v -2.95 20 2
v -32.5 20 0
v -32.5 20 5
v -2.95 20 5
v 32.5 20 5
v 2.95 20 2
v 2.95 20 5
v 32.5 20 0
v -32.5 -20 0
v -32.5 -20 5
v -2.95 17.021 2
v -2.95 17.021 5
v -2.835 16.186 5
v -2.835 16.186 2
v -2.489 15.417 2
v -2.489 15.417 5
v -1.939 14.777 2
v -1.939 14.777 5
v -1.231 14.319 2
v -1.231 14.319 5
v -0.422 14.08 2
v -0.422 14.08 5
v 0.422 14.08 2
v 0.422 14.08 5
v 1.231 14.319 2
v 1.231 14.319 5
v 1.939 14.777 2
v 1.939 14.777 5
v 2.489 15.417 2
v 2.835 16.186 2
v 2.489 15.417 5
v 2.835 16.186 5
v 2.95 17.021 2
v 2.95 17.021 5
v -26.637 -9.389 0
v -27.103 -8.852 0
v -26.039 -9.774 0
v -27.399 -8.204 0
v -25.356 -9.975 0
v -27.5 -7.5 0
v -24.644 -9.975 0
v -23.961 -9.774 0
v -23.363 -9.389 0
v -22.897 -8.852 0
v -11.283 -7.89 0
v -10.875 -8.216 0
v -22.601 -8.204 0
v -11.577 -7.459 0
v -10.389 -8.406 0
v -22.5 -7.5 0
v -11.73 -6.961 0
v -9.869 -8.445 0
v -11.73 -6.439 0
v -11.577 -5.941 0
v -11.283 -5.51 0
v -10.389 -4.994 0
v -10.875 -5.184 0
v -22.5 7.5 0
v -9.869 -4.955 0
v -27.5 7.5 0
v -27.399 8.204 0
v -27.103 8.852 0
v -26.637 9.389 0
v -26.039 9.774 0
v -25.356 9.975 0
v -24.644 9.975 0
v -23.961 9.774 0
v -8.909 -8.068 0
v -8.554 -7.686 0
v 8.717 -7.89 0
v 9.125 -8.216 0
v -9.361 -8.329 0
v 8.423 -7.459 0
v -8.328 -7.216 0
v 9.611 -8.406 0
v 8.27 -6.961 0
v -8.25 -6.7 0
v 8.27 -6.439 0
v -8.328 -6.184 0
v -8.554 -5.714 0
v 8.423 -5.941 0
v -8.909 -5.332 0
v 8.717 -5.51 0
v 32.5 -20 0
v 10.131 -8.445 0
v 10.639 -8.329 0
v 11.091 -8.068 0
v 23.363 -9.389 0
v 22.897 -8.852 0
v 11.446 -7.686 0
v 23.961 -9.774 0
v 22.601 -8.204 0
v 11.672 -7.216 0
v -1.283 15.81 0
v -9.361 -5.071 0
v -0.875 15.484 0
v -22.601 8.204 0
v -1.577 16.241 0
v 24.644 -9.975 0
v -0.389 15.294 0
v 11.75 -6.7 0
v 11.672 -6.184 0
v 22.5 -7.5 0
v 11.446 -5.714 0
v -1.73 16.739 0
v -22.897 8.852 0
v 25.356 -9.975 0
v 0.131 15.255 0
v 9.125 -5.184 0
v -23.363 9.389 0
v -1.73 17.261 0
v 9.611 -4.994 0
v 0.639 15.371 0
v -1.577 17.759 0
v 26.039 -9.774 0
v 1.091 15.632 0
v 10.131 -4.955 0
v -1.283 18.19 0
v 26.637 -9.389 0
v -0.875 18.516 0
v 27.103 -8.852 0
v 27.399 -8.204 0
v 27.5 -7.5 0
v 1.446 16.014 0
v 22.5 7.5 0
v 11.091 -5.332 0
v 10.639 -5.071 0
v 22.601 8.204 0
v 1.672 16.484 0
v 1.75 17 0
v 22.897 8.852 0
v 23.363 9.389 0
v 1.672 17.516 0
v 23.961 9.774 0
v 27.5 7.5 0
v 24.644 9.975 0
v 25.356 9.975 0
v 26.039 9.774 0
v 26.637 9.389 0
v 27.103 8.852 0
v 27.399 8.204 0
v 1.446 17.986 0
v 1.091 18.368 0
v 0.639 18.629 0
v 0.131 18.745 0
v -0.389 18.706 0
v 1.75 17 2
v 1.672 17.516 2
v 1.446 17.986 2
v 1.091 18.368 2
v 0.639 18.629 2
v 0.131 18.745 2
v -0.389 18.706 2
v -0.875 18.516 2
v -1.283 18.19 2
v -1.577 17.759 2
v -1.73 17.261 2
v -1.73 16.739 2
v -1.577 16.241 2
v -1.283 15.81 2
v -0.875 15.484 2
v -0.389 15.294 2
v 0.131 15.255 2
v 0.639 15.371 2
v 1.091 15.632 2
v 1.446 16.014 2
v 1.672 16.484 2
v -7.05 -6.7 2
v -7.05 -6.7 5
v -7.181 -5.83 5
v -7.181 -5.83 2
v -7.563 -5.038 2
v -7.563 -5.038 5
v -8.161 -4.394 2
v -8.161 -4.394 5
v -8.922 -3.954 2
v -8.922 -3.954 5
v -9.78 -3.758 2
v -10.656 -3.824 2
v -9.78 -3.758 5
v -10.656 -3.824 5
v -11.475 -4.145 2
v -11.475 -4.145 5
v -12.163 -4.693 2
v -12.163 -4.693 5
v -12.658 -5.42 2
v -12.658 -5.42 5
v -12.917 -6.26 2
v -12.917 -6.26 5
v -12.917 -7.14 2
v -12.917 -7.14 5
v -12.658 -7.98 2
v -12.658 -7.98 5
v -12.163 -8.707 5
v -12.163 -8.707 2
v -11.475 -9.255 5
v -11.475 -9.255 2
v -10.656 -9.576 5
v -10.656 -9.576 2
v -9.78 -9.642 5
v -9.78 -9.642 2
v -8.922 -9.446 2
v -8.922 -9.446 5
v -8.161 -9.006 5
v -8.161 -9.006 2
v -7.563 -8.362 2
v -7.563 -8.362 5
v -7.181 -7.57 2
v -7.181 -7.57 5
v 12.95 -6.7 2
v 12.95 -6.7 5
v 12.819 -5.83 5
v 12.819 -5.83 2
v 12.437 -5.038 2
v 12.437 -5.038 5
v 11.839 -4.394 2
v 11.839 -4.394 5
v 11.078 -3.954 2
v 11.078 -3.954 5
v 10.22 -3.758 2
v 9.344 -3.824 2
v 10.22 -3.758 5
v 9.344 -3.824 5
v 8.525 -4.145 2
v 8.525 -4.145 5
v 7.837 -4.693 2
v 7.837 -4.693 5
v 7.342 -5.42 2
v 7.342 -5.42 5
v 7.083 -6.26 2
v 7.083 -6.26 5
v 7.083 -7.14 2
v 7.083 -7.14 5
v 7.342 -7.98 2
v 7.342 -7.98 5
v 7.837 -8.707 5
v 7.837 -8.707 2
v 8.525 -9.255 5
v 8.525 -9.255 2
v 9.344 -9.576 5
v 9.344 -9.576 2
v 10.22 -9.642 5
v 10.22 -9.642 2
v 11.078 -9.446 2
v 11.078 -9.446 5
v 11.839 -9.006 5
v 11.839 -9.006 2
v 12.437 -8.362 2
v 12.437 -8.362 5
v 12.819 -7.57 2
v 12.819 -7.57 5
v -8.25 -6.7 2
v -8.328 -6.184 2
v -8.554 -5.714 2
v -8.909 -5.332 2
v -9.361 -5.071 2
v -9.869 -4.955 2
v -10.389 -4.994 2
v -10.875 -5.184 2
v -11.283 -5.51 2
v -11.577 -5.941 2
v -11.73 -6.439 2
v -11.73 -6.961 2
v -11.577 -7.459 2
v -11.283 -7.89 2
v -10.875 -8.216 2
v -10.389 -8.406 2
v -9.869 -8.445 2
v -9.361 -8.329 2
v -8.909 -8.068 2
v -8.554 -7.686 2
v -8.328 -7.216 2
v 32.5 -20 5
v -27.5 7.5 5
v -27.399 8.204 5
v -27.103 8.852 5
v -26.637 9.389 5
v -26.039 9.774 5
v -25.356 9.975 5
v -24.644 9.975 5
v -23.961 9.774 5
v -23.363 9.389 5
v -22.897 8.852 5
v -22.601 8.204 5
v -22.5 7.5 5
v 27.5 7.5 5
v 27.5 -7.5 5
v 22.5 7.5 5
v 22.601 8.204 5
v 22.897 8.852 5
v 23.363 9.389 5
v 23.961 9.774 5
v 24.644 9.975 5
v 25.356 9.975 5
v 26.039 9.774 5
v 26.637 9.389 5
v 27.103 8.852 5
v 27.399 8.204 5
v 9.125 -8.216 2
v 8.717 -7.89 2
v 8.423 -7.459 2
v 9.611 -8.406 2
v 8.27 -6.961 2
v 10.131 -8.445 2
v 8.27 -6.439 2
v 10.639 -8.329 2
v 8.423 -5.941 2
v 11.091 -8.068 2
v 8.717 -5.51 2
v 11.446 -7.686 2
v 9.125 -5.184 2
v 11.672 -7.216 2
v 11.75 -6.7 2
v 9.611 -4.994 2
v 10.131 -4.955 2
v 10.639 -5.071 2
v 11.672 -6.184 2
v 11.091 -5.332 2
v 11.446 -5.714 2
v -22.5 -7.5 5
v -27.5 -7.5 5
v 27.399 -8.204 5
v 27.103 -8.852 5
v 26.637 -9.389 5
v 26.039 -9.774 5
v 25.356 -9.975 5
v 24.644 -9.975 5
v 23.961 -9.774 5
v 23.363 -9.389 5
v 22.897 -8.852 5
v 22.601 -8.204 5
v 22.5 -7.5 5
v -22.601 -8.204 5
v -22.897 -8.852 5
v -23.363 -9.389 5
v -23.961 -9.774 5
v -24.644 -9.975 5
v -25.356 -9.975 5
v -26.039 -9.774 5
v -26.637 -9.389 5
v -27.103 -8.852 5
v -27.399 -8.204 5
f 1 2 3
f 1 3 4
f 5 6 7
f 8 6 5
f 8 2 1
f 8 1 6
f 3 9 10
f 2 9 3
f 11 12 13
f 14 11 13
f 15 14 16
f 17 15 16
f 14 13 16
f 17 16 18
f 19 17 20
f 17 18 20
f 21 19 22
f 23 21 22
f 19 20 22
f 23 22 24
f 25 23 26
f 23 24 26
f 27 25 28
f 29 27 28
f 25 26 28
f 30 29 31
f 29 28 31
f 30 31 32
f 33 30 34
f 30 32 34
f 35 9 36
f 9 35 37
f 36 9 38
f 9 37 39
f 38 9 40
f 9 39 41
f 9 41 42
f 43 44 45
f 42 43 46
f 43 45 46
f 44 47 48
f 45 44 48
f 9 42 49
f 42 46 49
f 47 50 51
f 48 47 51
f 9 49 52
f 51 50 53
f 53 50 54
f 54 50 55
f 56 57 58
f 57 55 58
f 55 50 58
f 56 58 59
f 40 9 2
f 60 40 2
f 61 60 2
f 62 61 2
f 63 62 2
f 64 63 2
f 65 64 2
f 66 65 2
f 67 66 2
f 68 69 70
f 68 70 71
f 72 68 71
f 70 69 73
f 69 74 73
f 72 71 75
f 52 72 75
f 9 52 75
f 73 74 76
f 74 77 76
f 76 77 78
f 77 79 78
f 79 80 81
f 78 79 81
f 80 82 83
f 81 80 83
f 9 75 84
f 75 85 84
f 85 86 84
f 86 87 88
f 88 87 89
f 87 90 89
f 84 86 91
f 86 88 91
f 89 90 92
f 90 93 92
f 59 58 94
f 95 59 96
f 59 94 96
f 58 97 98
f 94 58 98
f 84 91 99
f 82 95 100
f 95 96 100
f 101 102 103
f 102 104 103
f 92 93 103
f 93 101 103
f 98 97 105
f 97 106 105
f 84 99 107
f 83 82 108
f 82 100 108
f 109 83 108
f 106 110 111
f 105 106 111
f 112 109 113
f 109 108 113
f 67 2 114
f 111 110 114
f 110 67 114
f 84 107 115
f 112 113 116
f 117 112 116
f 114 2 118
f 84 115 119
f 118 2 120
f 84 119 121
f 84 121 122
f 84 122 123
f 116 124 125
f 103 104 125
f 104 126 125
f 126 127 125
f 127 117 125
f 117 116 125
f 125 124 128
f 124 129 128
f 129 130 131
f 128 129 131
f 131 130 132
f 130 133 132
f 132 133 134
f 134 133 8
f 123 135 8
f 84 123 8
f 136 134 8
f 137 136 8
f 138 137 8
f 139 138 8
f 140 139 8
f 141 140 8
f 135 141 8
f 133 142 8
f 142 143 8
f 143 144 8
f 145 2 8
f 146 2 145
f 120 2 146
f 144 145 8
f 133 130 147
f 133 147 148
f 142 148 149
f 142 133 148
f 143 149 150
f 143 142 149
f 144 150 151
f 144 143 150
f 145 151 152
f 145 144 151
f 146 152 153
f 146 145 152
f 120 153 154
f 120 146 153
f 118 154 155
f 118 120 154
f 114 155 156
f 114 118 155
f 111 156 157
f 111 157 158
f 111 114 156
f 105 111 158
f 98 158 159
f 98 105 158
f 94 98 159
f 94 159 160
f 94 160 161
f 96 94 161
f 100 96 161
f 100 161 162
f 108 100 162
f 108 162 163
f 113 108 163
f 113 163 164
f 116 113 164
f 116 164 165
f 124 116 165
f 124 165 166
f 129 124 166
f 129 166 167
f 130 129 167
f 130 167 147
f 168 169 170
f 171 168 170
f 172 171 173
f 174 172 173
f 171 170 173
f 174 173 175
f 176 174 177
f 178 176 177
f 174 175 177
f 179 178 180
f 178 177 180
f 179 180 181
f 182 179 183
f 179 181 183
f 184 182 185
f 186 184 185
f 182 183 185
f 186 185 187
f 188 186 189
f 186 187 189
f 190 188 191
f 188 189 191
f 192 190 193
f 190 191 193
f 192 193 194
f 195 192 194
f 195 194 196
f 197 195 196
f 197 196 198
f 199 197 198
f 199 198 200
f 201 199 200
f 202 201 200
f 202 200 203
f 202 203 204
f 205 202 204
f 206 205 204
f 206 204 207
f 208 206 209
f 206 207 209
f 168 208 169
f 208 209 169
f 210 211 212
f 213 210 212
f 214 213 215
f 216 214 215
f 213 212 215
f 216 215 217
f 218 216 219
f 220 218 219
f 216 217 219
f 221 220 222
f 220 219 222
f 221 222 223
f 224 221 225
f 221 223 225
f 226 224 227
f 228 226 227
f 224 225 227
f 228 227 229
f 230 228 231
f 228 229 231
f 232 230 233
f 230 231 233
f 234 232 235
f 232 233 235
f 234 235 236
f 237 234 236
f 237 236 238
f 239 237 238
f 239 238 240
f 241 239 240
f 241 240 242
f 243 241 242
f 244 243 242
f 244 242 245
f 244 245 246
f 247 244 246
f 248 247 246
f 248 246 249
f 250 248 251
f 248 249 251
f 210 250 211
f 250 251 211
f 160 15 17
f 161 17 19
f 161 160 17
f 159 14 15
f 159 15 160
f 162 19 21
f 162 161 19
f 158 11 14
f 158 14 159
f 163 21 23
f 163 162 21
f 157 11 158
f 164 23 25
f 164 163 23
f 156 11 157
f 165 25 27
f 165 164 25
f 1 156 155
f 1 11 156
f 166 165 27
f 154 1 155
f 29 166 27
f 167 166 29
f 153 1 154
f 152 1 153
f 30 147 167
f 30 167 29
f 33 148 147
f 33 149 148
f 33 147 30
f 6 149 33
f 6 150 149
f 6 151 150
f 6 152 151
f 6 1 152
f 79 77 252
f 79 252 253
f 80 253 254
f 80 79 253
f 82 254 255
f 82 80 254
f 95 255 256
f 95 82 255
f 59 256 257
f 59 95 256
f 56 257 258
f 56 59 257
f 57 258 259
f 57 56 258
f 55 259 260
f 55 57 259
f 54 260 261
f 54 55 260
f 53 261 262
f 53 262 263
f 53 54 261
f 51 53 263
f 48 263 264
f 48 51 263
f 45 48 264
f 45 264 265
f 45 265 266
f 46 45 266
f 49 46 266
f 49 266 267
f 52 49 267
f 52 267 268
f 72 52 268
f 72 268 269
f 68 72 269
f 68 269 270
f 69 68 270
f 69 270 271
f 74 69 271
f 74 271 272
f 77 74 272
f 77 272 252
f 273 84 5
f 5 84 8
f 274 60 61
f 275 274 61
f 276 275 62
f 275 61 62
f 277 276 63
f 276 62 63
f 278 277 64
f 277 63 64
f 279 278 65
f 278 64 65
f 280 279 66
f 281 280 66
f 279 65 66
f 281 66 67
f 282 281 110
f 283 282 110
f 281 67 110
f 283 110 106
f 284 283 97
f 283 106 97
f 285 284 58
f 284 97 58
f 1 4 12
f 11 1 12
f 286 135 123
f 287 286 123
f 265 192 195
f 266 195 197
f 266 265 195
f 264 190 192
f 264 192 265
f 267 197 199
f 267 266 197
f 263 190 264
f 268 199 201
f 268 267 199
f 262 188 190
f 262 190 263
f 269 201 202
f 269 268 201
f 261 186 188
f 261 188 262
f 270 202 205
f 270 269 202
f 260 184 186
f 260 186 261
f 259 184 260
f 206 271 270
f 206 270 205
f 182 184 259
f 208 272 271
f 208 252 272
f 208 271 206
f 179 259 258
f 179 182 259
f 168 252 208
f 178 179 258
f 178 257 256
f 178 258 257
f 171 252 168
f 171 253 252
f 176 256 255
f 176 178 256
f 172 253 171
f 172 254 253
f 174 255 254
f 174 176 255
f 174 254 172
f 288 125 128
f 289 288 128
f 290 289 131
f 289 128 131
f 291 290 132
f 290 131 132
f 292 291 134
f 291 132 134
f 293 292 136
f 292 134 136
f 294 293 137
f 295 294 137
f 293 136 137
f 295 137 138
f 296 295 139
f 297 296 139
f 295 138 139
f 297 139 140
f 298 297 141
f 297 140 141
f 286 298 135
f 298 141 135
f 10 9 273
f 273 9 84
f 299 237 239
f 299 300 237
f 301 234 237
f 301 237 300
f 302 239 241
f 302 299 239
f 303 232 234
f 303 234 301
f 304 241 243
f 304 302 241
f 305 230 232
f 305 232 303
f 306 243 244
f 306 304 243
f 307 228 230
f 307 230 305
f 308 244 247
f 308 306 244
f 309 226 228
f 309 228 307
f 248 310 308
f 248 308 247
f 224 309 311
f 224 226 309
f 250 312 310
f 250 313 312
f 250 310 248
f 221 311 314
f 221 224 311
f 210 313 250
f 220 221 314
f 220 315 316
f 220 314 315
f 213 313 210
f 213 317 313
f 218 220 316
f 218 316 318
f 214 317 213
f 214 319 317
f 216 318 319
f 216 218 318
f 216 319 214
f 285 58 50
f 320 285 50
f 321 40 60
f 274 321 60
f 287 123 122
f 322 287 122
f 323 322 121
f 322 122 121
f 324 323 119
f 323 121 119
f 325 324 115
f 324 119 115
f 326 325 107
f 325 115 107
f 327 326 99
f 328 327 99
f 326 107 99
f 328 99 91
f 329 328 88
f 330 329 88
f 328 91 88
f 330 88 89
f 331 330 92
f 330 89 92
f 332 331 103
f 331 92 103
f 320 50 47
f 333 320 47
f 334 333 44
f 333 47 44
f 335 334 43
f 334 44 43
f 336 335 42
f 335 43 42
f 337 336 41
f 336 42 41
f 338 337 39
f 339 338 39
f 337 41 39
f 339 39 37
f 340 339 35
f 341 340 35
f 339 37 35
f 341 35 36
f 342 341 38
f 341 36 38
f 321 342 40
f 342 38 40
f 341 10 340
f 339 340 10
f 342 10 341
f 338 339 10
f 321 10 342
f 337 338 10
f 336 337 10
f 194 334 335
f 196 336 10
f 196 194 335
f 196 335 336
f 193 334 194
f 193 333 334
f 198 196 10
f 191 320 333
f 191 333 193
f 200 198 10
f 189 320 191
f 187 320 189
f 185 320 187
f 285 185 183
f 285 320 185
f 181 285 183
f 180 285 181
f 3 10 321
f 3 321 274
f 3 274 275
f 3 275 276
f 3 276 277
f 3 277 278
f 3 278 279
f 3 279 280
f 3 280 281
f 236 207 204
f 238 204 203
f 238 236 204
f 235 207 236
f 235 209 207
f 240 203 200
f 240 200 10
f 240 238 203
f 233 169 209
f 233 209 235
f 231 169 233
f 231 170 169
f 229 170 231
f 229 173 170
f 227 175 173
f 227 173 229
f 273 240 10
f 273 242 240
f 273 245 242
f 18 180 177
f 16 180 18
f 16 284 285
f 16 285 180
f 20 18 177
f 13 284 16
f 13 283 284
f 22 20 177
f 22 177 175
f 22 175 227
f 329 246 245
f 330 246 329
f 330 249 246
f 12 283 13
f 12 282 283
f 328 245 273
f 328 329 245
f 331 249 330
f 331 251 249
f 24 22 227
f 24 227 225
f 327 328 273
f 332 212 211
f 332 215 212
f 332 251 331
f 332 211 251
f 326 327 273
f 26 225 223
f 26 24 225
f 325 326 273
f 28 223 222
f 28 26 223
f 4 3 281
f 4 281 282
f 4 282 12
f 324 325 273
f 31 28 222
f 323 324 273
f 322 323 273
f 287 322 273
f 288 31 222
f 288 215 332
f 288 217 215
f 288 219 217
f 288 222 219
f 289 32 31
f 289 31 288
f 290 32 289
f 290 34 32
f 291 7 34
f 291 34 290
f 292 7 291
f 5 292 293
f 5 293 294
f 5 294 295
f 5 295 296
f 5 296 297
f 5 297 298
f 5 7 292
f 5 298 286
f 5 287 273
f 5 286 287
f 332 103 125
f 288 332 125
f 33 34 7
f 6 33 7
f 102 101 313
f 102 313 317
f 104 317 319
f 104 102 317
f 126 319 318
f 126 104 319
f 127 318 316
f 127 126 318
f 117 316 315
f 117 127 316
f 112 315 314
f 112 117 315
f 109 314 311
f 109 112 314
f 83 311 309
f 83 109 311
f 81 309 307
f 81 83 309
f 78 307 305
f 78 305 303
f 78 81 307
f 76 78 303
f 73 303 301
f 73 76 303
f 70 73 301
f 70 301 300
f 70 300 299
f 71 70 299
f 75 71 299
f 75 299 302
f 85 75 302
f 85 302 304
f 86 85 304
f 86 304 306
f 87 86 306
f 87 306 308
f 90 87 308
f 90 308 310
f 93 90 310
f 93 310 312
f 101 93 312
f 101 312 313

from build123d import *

# Parameters (mm, degrees)
F0_W     = 65
F0_H     = 40
F0_R     = 1.75
F1_DEPTH = 5
F2_R     = 2.95
F2_R_2   = 1.75
F3_DEPTH = 3


with BuildPart() as f1:
    # F0 (on Top) → F1 (new body)
    with BuildSketch(Plane.XY):
        Rectangle(F0_W, F0_H)
        with Locations((-10, -6.7)):
            Circle(F0_R, mode=Mode.SUBTRACT)
        with Locations((10, -6.7)):
            Circle(F0_R, mode=Mode.SUBTRACT)
        with BuildLine():
            ThreePointArc((-22.5, -7.5), (-25, -10), (-27.5, -7.5))
            Line((-27.5, -7.5), (-27.5, 7.5))
            ThreePointArc((-27.5, 7.5), (-25, 10), (-22.5, 7.5))
            Line((-22.5, 7.5), (-22.5, -7.5))
        make_face(mode=Mode.SUBTRACT)
        with BuildLine():
            ThreePointArc((27.5, -7.5), (25, -10), (22.5, -7.5))
            Line((22.5, -7.5), (22.5, 7.5))
            ThreePointArc((22.5, 7.5), (25, 10), (27.5, 7.5))
            Line((27.5, 7.5), (27.5, -7.5))
        make_face(mode=Mode.SUBTRACT)
        with Locations((0, 17)):
            Circle(F0_R, mode=Mode.SUBTRACT)
    extrude(amount=F1_DEPTH)

    # F2 (on face) → F3 (cut)
    with BuildSketch(Plane.XY.offset(5)):
        with Locations((10, -6.7)):
            Circle(F2_R)
        with Locations((10, -6.7)):
            Circle(F2_R_2, mode=Mode.SUBTRACT)
        with Locations((-10, -6.7)):
            Circle(F2_R_2)
        with Locations((-10, -6.7)):
            Circle(F2_R)
        with Locations((-10, -6.7)):
            Circle(F2_R_2, mode=Mode.SUBTRACT)
        with BuildLine():
            Line((-2.949923, 20), (-2.949923, 17.021281))
            ThreePointArc((-2.949923, 17.021281), (0, 14.05), (2.949923, 17.021281))
            Line((2.949923, 17.021281), (2.949923, 20))
            Line((2.949923, 20), (-2.949923, 20))
        make_face()
        with Locations((0, 17)):
            Circle(F2_R_2, mode=Mode.SUBTRACT)
    extrude(amount=-F3_DEPTH, mode=Mode.SUBTRACT)


solid = f1.part
